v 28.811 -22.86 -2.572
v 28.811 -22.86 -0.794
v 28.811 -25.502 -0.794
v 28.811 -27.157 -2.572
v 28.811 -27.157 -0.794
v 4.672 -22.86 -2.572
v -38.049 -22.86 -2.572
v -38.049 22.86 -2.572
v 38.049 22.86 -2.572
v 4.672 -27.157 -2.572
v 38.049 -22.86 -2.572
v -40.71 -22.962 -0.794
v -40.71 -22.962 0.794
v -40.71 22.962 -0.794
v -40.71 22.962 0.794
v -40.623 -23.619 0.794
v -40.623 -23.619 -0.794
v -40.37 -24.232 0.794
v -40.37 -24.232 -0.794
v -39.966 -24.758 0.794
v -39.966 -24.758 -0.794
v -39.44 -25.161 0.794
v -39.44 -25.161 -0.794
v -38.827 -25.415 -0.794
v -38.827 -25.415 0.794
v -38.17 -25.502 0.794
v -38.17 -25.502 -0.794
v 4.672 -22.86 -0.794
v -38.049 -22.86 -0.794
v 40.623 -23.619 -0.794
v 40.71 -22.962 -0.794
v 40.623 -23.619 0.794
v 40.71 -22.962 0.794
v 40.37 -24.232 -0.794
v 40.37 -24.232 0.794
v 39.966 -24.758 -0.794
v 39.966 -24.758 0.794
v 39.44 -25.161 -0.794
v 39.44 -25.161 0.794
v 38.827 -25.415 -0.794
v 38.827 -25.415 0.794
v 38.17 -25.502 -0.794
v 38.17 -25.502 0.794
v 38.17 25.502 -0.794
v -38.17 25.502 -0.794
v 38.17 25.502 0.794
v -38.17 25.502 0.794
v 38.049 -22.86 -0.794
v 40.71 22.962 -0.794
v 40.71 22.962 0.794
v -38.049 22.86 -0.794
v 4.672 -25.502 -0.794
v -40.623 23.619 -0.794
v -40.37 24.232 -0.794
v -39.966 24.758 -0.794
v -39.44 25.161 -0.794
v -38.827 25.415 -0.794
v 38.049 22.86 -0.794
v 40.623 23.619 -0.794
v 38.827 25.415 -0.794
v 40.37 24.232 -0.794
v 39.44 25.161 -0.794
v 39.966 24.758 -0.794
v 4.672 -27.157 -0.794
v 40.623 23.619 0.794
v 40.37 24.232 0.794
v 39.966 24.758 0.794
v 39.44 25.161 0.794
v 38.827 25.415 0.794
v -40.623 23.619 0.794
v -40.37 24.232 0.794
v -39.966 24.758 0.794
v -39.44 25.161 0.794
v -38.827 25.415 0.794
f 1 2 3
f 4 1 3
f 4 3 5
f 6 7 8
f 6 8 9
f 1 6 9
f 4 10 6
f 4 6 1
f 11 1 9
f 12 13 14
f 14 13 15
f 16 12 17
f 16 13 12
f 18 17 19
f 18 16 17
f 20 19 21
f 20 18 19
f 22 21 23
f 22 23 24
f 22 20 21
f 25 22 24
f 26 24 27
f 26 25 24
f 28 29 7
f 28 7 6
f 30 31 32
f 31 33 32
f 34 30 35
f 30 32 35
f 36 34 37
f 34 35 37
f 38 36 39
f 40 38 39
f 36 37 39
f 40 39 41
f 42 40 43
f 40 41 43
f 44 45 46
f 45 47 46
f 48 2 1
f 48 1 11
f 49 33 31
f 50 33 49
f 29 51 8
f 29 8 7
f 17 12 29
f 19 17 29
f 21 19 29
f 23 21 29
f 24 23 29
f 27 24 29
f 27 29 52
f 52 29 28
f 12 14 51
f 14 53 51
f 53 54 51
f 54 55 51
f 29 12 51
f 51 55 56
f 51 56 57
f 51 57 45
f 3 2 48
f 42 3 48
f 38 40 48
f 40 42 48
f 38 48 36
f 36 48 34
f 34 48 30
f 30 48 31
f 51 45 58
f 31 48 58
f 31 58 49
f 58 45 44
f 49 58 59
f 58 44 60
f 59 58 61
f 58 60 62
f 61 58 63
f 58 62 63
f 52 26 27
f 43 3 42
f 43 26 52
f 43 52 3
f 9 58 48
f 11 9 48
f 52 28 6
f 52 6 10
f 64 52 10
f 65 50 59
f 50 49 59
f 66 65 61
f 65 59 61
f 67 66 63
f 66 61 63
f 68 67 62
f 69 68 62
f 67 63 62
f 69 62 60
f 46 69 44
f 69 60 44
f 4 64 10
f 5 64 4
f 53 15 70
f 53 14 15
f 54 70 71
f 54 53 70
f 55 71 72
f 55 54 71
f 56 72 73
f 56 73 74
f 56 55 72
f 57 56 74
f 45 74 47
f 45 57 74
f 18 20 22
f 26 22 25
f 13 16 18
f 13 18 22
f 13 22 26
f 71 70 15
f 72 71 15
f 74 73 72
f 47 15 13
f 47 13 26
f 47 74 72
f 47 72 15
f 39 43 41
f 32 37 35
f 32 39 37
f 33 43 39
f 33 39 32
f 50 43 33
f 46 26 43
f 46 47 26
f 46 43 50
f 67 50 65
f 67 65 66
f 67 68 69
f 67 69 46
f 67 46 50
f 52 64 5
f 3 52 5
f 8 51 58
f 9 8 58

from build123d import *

# Parameters (mm, degrees)
F0_W     = 81.4197
F0_H     = 51.0032
F1_DEPTH = 0.79375
F2_R     = 2.54
F3_W     = 76.0984
F3_H     = 45.72
F4_DEPTH = 1.778
F5_W     = 24.139271
F5_H     = 10.512263
F6_DEPTH = 1.778


with BuildPart() as f1:
    # F0 (on Top) → F1 (new body, symmetric)
    with BuildSketch(Plane.XY):
        Rectangle(F0_W, F0_H)
    extrude(amount=F1_DEPTH, both=True)

    # F2
    f2_edges = [f1.edges().sort_by_distance(p)[0] for p in [
        (40.70985, -25.5016, 0),
        (40.70985, 25.5016, 0),
        (-40.70985, -25.5016, 0),
        (-40.70985, 25.5016, 0),
    ]]
    fillet(f2_edges, radius=F2_R)

    # F3 (on face) → F4 (join)
    with BuildSketch(Plane(origin=(0, 0, -0.79375), x_dir=(1, 0, 0), z_dir=(0, 0, -1))):
        Rectangle(F3_W, F3_H)
    extrude(amount=F4_DEPTH)

    # F5 (on face) → F6 (join, through all)
    with BuildSketch(Plane(origin=(0, 0, -0.79375), x_dir=(1, 0, 0), z_dir=(0, 0, -1))):
        with Locations((16.741752, 21.900548)):
            Rectangle(F5_W, F5_H)
    extrude(amount=F6_DEPTH)


solid = f1.part
